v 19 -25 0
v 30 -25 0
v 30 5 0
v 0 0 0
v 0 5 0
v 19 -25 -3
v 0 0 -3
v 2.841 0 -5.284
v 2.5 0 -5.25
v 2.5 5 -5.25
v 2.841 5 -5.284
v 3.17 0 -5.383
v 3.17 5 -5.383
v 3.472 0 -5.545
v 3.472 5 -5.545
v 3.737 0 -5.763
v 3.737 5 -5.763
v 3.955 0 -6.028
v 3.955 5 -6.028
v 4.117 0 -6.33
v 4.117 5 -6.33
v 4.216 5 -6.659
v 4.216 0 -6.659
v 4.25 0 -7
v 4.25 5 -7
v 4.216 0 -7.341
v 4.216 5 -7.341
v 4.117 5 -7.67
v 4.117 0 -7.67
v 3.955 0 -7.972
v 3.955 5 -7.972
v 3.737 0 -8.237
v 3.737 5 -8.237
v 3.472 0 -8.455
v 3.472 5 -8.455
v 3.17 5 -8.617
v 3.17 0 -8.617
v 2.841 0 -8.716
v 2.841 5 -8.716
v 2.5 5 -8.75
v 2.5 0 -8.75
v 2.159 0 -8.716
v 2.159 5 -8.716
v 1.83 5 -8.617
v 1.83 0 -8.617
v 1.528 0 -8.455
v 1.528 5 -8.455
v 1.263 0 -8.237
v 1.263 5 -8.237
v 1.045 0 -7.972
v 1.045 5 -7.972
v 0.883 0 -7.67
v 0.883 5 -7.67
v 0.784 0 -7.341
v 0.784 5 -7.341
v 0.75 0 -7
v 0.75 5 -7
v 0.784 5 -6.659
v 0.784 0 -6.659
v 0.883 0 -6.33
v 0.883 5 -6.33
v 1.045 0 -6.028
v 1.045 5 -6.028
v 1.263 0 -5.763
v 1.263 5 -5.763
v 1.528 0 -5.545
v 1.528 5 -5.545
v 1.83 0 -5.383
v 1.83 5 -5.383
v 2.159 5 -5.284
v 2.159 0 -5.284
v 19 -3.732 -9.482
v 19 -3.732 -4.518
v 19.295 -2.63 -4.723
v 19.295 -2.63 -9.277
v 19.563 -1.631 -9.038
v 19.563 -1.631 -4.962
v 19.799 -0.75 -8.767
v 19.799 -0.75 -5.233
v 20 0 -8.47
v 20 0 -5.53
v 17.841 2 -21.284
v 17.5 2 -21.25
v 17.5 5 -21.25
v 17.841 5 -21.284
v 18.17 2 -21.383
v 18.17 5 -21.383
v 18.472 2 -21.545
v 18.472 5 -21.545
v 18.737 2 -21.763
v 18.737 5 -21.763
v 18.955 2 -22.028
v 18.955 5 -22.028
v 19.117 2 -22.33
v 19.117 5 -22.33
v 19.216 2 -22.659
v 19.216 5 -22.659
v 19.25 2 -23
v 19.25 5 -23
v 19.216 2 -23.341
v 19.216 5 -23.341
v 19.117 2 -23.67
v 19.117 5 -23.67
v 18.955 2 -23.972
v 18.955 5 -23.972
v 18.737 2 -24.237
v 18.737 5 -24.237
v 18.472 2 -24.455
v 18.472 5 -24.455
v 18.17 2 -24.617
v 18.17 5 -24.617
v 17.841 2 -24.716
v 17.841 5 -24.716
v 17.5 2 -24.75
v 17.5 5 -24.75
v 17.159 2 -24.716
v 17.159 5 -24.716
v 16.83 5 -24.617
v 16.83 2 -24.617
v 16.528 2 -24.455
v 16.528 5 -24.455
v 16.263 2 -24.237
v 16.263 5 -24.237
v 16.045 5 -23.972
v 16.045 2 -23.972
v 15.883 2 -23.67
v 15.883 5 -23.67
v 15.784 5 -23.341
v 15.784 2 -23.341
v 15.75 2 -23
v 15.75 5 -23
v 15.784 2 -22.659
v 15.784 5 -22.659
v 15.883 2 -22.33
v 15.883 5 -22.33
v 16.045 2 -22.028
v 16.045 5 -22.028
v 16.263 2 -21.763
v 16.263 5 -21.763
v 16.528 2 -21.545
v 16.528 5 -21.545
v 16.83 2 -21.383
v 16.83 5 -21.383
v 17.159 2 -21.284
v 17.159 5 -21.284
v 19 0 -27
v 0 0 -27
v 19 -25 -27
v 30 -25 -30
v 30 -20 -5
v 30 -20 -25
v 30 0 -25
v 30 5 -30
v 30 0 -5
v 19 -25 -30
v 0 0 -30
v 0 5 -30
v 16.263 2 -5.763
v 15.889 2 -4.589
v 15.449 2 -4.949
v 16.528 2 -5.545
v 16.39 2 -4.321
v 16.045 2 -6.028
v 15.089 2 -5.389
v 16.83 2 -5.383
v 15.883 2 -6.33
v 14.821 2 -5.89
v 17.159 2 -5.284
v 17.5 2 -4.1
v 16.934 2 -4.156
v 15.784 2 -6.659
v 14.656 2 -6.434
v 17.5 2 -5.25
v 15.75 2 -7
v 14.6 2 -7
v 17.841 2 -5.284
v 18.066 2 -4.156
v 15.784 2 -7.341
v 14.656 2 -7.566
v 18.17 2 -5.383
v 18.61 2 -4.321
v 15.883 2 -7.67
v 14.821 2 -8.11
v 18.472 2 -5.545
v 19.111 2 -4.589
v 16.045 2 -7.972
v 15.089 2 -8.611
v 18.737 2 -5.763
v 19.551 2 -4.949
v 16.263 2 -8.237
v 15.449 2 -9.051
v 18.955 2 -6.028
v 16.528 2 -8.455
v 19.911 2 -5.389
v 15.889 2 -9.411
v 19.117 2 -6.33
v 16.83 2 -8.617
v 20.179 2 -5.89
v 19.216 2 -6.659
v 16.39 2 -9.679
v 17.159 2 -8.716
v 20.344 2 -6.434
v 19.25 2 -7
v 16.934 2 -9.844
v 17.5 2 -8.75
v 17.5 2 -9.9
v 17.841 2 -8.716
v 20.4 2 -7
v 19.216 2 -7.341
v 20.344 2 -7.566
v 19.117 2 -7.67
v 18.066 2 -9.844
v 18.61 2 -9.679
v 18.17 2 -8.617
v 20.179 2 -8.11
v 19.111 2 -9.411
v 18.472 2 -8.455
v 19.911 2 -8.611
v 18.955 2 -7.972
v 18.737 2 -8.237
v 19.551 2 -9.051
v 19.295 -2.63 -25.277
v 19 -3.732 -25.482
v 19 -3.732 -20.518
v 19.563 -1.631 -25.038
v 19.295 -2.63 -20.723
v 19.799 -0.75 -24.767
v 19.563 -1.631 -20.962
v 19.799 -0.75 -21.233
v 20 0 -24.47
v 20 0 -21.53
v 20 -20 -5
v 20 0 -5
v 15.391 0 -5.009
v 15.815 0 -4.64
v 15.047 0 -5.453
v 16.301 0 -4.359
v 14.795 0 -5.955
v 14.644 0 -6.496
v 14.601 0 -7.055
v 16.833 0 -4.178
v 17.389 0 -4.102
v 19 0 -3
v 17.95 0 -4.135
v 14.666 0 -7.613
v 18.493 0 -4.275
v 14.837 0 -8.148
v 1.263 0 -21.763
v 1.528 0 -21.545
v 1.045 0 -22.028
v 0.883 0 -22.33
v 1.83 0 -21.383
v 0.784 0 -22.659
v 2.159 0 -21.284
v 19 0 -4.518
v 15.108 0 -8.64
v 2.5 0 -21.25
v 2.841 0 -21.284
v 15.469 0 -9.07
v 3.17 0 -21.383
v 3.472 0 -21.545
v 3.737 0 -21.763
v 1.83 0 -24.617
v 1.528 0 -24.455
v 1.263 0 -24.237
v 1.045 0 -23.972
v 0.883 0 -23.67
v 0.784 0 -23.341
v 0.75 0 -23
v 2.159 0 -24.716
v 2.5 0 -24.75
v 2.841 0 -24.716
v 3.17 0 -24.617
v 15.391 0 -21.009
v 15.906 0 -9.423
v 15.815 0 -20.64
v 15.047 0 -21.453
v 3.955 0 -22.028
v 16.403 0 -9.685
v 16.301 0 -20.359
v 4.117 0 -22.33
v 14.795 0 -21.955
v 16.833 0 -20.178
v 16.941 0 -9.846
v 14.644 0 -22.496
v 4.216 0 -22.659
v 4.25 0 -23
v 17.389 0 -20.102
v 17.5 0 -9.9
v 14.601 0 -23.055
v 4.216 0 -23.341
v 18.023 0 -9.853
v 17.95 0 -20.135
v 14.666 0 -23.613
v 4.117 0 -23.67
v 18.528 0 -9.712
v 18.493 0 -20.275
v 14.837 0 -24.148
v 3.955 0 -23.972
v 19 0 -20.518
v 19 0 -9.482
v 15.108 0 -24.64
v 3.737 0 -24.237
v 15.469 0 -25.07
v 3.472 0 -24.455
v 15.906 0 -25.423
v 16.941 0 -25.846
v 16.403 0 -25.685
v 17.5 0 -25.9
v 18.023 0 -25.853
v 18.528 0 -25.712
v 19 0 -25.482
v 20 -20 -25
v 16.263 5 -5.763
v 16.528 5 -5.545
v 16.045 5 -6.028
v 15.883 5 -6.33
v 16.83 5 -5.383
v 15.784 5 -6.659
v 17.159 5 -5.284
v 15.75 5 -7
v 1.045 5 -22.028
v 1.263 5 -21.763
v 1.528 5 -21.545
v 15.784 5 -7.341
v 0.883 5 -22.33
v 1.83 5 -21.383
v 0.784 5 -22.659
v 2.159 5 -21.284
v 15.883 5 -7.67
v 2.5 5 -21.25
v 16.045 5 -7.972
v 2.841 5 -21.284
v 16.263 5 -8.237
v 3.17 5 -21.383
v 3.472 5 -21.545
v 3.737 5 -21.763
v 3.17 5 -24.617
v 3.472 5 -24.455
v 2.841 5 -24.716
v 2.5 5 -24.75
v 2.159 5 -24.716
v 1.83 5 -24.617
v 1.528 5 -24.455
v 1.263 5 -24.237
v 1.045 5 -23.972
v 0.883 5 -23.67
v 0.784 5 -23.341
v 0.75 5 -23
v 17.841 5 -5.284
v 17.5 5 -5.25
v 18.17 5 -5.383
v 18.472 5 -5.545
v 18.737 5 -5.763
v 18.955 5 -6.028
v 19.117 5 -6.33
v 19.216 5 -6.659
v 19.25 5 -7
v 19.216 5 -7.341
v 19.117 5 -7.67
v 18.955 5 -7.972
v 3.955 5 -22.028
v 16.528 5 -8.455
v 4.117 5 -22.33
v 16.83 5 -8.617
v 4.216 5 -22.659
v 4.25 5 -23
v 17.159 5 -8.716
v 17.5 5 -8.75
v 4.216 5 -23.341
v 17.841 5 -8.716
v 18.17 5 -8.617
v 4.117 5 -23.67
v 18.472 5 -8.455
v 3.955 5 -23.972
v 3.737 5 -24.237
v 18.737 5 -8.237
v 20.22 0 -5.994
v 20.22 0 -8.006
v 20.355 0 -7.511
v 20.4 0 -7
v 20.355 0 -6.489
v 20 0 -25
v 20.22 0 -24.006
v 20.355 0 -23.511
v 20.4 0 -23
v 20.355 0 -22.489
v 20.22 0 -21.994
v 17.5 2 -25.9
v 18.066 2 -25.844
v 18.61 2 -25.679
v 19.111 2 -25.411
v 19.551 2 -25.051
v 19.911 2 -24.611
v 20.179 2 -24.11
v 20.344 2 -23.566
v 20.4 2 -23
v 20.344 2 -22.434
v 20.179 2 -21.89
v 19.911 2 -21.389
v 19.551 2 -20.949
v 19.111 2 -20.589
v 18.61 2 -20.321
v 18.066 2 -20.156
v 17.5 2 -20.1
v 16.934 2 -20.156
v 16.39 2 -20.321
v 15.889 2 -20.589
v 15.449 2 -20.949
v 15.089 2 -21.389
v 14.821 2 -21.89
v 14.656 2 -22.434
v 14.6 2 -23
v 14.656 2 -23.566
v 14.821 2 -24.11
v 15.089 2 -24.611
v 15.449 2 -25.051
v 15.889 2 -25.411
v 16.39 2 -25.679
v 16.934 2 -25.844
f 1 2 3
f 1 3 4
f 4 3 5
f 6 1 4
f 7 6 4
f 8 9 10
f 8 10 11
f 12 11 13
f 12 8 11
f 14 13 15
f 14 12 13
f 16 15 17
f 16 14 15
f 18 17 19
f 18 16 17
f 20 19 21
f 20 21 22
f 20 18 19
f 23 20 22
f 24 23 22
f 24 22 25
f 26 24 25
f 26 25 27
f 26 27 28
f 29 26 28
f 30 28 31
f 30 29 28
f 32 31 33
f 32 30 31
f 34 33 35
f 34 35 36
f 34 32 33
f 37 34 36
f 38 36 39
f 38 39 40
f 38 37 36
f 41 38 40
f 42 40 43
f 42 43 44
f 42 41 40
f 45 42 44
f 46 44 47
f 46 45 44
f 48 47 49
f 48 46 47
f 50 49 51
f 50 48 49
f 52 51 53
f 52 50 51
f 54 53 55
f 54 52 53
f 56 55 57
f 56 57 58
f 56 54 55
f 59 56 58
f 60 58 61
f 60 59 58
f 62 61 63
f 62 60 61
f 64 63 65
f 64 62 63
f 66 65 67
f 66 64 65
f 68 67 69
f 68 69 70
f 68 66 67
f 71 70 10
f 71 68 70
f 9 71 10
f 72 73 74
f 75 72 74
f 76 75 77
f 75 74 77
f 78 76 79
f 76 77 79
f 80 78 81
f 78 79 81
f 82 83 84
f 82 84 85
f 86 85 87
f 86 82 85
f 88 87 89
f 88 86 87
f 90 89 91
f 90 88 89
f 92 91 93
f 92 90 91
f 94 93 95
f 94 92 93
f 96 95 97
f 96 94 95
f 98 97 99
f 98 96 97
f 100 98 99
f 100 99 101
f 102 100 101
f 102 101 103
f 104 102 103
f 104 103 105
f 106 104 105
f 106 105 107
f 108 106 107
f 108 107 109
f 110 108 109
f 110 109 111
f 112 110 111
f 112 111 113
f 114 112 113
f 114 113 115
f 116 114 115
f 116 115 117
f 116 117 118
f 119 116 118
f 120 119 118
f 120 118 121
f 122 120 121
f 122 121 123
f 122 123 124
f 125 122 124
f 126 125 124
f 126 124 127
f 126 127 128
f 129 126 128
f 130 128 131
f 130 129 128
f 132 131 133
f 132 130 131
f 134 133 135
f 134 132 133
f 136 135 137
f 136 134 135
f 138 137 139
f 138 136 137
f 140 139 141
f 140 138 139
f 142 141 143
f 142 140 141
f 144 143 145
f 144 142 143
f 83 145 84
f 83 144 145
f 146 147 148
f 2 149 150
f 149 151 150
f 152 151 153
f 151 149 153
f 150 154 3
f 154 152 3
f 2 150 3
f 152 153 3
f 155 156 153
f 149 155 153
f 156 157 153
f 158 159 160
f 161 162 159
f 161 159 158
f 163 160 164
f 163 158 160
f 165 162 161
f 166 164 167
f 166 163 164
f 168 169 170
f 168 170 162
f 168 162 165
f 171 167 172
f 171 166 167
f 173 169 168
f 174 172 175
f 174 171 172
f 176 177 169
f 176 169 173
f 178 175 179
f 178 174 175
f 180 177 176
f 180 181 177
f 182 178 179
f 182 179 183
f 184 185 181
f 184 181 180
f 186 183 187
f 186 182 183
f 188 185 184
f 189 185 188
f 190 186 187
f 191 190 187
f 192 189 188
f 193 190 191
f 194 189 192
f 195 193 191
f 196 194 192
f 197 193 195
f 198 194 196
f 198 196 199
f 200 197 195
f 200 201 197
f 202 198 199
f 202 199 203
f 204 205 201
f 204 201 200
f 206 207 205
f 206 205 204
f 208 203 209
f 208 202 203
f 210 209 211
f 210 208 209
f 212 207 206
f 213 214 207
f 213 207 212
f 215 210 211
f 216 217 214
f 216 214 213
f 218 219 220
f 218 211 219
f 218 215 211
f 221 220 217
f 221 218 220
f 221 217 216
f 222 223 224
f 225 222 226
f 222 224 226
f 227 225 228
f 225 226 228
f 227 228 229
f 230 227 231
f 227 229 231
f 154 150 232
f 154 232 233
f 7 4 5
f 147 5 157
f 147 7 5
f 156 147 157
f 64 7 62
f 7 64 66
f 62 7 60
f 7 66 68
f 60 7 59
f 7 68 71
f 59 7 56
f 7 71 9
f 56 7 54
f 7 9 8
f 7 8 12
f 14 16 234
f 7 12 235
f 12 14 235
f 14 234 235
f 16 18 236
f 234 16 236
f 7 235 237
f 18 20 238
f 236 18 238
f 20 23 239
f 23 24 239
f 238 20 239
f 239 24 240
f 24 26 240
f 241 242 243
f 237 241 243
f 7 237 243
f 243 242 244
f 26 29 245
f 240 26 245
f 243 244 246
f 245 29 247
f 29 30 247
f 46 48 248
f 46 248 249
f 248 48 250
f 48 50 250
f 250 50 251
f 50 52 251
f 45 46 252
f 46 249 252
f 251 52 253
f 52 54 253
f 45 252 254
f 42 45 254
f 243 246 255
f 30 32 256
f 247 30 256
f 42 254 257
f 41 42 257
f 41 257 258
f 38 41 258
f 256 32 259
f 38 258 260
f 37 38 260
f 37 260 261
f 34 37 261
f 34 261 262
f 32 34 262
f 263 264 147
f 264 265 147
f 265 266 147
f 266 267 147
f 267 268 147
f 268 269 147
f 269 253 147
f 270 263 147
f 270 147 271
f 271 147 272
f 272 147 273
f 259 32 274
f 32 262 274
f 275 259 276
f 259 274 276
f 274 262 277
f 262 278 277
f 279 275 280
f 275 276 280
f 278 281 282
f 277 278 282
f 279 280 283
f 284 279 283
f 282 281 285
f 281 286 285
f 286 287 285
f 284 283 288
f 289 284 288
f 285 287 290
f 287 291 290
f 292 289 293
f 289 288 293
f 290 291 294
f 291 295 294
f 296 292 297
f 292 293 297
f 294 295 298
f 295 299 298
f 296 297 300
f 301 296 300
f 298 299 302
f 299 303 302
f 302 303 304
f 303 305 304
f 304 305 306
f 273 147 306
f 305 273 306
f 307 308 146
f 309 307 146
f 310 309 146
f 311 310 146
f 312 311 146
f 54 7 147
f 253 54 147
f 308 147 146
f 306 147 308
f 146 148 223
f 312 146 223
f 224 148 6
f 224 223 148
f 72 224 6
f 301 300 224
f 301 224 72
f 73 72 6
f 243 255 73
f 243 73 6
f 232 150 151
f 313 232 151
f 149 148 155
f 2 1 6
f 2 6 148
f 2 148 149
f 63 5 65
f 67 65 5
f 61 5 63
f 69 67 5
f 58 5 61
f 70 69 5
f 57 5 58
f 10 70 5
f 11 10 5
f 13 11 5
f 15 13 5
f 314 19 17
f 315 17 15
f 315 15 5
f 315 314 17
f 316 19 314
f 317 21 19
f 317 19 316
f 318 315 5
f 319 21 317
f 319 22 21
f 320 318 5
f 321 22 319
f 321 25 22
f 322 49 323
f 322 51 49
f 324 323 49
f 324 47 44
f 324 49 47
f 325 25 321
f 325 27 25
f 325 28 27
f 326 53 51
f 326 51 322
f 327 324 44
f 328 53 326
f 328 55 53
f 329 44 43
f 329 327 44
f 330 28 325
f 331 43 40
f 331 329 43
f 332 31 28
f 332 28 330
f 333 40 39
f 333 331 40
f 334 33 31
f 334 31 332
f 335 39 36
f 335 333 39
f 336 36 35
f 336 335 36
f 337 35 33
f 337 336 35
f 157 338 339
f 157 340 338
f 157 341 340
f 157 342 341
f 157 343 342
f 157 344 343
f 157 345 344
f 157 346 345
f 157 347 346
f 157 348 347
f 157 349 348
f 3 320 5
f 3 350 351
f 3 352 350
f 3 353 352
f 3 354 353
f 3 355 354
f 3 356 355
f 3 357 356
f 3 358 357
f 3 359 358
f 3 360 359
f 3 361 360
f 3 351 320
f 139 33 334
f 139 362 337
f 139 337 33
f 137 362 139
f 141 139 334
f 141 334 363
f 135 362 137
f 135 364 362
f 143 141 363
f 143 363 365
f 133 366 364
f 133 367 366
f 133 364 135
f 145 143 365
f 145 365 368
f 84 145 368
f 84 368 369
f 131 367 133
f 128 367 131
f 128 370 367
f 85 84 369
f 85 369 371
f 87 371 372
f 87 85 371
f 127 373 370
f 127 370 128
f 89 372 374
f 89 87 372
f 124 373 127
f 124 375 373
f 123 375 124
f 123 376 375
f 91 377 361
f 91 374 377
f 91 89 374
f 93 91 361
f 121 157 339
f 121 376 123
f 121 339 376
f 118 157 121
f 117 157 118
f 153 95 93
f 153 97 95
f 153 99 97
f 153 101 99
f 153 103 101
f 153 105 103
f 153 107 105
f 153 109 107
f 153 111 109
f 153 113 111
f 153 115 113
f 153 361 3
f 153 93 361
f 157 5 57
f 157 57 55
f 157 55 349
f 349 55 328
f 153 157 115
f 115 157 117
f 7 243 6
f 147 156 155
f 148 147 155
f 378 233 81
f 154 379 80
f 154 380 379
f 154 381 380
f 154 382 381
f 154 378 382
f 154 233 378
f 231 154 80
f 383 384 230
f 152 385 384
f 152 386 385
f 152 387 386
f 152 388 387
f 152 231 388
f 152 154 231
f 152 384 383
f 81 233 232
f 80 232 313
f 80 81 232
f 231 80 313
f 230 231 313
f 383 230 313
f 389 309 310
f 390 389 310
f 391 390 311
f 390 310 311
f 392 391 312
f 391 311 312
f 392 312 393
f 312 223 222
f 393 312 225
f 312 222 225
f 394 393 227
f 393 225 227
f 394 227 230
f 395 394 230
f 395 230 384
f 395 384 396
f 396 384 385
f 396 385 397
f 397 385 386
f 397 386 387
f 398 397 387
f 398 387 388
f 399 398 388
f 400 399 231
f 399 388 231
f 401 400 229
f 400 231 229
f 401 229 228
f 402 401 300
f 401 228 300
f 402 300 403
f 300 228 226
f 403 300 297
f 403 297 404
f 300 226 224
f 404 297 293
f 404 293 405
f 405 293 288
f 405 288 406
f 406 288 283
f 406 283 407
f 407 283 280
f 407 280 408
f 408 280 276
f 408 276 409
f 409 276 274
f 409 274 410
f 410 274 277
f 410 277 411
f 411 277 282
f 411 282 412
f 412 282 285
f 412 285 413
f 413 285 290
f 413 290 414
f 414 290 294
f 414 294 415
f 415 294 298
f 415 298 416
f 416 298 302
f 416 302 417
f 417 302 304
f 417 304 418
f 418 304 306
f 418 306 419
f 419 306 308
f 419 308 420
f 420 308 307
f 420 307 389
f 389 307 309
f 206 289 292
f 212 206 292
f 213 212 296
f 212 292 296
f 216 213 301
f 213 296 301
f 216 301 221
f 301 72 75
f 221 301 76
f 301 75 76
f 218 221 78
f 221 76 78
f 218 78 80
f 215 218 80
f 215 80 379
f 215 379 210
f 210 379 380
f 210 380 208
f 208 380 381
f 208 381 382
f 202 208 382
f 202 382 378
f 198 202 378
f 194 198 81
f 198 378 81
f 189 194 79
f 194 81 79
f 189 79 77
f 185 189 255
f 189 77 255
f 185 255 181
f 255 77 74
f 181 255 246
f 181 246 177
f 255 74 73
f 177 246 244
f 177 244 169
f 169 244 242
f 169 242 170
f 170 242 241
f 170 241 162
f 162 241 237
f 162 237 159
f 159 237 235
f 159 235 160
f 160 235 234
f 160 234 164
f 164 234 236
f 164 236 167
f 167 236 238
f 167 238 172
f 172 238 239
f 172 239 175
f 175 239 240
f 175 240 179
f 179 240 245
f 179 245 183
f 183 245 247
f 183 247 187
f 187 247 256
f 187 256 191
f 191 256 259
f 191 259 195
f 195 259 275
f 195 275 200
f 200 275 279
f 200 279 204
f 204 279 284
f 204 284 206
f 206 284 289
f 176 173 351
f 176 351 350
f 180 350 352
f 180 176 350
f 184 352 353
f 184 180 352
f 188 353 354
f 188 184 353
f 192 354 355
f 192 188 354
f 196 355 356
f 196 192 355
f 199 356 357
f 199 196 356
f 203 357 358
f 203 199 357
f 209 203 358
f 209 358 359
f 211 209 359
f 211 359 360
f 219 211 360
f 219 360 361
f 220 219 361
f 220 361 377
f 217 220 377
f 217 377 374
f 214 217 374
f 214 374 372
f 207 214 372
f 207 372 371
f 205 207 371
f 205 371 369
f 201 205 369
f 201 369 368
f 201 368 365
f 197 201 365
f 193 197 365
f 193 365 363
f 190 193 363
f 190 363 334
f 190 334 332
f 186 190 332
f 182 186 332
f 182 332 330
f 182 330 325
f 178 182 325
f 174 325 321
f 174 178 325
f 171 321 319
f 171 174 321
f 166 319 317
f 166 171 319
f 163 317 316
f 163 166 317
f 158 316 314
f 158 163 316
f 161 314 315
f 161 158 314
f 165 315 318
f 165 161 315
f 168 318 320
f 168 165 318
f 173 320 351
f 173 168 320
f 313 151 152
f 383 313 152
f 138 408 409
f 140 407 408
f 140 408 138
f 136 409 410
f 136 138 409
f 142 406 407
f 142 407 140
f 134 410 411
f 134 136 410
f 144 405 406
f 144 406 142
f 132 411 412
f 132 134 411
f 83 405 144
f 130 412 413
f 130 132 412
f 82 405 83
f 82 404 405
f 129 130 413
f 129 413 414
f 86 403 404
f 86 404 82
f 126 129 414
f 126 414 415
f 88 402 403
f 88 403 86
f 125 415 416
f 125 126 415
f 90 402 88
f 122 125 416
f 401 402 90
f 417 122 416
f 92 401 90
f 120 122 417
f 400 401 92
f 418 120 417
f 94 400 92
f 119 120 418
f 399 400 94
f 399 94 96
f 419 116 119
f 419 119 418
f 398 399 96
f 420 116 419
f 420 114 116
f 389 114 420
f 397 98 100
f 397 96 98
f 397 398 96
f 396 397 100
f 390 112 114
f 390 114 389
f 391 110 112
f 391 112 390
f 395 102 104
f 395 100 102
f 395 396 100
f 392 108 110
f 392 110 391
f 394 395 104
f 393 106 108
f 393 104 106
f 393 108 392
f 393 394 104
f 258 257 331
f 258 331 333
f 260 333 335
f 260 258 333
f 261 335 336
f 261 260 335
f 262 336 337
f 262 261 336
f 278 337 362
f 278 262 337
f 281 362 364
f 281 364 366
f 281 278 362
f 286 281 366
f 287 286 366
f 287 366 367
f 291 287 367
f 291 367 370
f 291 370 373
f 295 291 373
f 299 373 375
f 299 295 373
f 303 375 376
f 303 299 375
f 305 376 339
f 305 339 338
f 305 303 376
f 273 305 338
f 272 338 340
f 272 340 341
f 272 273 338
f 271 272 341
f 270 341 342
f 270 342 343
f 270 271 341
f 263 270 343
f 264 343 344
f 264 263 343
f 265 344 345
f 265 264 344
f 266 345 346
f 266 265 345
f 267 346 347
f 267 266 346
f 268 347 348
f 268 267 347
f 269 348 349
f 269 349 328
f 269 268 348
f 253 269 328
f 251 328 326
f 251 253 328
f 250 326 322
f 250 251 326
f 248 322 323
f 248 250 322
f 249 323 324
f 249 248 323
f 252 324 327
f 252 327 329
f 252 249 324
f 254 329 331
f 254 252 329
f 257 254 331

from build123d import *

# Parameters (mm, degrees)
SKETCH1_W           = 30
SKETCH1_H           = 30
SKETCH1_R           = 1.75
BOSS_EXTRUDE1_DEPTH = 5
SKETCH2_W           = 11
SKETCH2_H           = 30
BOSS_EXTRUDE2_DEPTH = 25
SKETCH3_W           = 20
SKETCH3_H           = 20
CUT_EXTRUDE1_DEPTH  = 10
BOSS_EXTRUDE3_DEPTH = 3
BOSS_EXTRUDE4_DEPTH = 3
SKETCH12_R          = 2.9
CUT_EXTRUDE3_DEPTH  = 2
CHAMFER3_SIZE       = 3.732050808
CHAMFER3_SIZE_2     = 1


with BuildPart() as part:
    # Sketch1 → Boss-Extrude1 (new body)
    with BuildSketch(Plane(origin=(0, 0, 0), x_dir=(1, 0, 0), z_dir=(0, 1, 0))):
        with Locations((15, 15)):
            Rectangle(SKETCH1_W, SKETCH1_H)
        with Locations(Location((2.5, 7, 0), (0, 0, 270))):
            Circle(SKETCH1_R, mode=Mode.SUBTRACT)
        with Locations(Location((17.5, 7, 0), (0, 0, 270))):
            Circle(SKETCH1_R, mode=Mode.SUBTRACT)
        with Locations(Location((2.5, 23, 0), (0, 0, 270))):
            Circle(SKETCH1_R, mode=Mode.SUBTRACT)
        with Locations(Location((17.5, 23, 0), (0, 0, 270))):
            Circle(SKETCH1_R, mode=Mode.SUBTRACT)
    extrude(amount=BOSS_EXTRUDE1_DEPTH)

    # Sketch2 → Boss-Extrude2 (add)
    with BuildSketch(Plane.XZ):
        with Locations((24.5, -15)):
            Rectangle(SKETCH2_W, SKETCH2_H)
    extrude(amount=BOSS_EXTRUDE2_DEPTH)

    # Sketch3 → Cut-Extrude1 (cut)
    with BuildSketch(Plane(origin=(30, 0, 0), x_dir=(0, 0, -1), z_dir=(1, 0, 0))):
        with Locations((15, -10)):
            Rectangle(SKETCH3_W, SKETCH3_H)
    extrude(amount=-CUT_EXTRUDE1_DEPTH, mode=Mode.SUBTRACT)

    # Sketch8 → Boss-Extrude3 (add)
    with BuildSketch(Plane(origin=(0, 0, -30), x_dir=(-1, 0, 0), z_dir=(0, 0, -1))):
        Polygon((-19, 0), (0, 0), (-19, -25), align=None)
    extrude(amount=-BOSS_EXTRUDE3_DEPTH)

    # Sketch11 → Boss-Extrude4 (add)
    with BuildSketch(Plane.XY):
        Polygon((19, -25), (0, 0), (19, 0), align=None)
    extrude(amount=-BOSS_EXTRUDE4_DEPTH)

    # Sketch12 → Cut-Extrude3 (cut)
    with BuildSketch(Plane.XZ):
        with Locations(Location((17.5, -23, 0), (0, 0, 270))):
            Circle(SKETCH12_R)
        with Locations(Location((17.5, -7, 0), (0, 0, 270))):
            Circle(SKETCH12_R)
    extrude(amount=-CUT_EXTRUDE3_DEPTH, mode=Mode.SUBTRACT)

    # Chamfer3
    # the kernel refuses this chamfer: 3.732050808, 1 mm, written as the material it takes off along each edge
    with BuildSketch(Plane(origin=(19, 0, -10.826968438), x_dir=(-0.009967146577155864, -0.9999503267608394, 0), z_dir=(0, 0, -1))) as chamfer3_piece_1_section:
        Polygon((CHAMFER3_SIZE * 0.999950326645, -CHAMFER3_SIZE * 0.009967146576), (-CHAMFER3_SIZE_2 * 0.00996714657716, -CHAMFER3_SIZE_2 * 0.999950326761), (0, 0), align=None)
    chamfer3_piece_1 = extrude(amount=24.346063125, mode=Mode.PRIVATE)
    chamfer3_piece_1 = chamfer3_piece_1 & Plane(origin=(17.5, -1.271193321, -23), x_dir=(0, 0, -1), z_dir=(0, -1, 0)) * Cylinder(2.9, 64, mode=Mode.PRIVATE)
    add(chamfer3_piece_1, mode=Mode.SUBTRACT)
    with BuildSketch(Plane(origin=(19, 0, 5.173031562), x_dir=(-0.009967146577155864, -0.9999503267608394, 0), z_dir=(0, 0, -1))) as chamfer3_piece_2_section:
        Polygon((CHAMFER3_SIZE * 0.999950326645, -CHAMFER3_SIZE * 0.009967146576), (-CHAMFER3_SIZE_2 * 0.00996714657716, -CHAMFER3_SIZE_2 * 0.999950326761), (0, 0), align=None)
    chamfer3_piece_2 = extrude(amount=24.346063125, mode=Mode.PRIVATE)
    chamfer3_piece_2 = chamfer3_piece_2 & Plane(origin=(17.5, -1.525075197, -7), x_dir=(0, 0, -1), z_dir=(0, -1, 0)) * Cylinder(2.9, 64, mode=Mode.PRIVATE)
    add(chamfer3_piece_2, mode=Mode.SUBTRACT)


solid = part.part
